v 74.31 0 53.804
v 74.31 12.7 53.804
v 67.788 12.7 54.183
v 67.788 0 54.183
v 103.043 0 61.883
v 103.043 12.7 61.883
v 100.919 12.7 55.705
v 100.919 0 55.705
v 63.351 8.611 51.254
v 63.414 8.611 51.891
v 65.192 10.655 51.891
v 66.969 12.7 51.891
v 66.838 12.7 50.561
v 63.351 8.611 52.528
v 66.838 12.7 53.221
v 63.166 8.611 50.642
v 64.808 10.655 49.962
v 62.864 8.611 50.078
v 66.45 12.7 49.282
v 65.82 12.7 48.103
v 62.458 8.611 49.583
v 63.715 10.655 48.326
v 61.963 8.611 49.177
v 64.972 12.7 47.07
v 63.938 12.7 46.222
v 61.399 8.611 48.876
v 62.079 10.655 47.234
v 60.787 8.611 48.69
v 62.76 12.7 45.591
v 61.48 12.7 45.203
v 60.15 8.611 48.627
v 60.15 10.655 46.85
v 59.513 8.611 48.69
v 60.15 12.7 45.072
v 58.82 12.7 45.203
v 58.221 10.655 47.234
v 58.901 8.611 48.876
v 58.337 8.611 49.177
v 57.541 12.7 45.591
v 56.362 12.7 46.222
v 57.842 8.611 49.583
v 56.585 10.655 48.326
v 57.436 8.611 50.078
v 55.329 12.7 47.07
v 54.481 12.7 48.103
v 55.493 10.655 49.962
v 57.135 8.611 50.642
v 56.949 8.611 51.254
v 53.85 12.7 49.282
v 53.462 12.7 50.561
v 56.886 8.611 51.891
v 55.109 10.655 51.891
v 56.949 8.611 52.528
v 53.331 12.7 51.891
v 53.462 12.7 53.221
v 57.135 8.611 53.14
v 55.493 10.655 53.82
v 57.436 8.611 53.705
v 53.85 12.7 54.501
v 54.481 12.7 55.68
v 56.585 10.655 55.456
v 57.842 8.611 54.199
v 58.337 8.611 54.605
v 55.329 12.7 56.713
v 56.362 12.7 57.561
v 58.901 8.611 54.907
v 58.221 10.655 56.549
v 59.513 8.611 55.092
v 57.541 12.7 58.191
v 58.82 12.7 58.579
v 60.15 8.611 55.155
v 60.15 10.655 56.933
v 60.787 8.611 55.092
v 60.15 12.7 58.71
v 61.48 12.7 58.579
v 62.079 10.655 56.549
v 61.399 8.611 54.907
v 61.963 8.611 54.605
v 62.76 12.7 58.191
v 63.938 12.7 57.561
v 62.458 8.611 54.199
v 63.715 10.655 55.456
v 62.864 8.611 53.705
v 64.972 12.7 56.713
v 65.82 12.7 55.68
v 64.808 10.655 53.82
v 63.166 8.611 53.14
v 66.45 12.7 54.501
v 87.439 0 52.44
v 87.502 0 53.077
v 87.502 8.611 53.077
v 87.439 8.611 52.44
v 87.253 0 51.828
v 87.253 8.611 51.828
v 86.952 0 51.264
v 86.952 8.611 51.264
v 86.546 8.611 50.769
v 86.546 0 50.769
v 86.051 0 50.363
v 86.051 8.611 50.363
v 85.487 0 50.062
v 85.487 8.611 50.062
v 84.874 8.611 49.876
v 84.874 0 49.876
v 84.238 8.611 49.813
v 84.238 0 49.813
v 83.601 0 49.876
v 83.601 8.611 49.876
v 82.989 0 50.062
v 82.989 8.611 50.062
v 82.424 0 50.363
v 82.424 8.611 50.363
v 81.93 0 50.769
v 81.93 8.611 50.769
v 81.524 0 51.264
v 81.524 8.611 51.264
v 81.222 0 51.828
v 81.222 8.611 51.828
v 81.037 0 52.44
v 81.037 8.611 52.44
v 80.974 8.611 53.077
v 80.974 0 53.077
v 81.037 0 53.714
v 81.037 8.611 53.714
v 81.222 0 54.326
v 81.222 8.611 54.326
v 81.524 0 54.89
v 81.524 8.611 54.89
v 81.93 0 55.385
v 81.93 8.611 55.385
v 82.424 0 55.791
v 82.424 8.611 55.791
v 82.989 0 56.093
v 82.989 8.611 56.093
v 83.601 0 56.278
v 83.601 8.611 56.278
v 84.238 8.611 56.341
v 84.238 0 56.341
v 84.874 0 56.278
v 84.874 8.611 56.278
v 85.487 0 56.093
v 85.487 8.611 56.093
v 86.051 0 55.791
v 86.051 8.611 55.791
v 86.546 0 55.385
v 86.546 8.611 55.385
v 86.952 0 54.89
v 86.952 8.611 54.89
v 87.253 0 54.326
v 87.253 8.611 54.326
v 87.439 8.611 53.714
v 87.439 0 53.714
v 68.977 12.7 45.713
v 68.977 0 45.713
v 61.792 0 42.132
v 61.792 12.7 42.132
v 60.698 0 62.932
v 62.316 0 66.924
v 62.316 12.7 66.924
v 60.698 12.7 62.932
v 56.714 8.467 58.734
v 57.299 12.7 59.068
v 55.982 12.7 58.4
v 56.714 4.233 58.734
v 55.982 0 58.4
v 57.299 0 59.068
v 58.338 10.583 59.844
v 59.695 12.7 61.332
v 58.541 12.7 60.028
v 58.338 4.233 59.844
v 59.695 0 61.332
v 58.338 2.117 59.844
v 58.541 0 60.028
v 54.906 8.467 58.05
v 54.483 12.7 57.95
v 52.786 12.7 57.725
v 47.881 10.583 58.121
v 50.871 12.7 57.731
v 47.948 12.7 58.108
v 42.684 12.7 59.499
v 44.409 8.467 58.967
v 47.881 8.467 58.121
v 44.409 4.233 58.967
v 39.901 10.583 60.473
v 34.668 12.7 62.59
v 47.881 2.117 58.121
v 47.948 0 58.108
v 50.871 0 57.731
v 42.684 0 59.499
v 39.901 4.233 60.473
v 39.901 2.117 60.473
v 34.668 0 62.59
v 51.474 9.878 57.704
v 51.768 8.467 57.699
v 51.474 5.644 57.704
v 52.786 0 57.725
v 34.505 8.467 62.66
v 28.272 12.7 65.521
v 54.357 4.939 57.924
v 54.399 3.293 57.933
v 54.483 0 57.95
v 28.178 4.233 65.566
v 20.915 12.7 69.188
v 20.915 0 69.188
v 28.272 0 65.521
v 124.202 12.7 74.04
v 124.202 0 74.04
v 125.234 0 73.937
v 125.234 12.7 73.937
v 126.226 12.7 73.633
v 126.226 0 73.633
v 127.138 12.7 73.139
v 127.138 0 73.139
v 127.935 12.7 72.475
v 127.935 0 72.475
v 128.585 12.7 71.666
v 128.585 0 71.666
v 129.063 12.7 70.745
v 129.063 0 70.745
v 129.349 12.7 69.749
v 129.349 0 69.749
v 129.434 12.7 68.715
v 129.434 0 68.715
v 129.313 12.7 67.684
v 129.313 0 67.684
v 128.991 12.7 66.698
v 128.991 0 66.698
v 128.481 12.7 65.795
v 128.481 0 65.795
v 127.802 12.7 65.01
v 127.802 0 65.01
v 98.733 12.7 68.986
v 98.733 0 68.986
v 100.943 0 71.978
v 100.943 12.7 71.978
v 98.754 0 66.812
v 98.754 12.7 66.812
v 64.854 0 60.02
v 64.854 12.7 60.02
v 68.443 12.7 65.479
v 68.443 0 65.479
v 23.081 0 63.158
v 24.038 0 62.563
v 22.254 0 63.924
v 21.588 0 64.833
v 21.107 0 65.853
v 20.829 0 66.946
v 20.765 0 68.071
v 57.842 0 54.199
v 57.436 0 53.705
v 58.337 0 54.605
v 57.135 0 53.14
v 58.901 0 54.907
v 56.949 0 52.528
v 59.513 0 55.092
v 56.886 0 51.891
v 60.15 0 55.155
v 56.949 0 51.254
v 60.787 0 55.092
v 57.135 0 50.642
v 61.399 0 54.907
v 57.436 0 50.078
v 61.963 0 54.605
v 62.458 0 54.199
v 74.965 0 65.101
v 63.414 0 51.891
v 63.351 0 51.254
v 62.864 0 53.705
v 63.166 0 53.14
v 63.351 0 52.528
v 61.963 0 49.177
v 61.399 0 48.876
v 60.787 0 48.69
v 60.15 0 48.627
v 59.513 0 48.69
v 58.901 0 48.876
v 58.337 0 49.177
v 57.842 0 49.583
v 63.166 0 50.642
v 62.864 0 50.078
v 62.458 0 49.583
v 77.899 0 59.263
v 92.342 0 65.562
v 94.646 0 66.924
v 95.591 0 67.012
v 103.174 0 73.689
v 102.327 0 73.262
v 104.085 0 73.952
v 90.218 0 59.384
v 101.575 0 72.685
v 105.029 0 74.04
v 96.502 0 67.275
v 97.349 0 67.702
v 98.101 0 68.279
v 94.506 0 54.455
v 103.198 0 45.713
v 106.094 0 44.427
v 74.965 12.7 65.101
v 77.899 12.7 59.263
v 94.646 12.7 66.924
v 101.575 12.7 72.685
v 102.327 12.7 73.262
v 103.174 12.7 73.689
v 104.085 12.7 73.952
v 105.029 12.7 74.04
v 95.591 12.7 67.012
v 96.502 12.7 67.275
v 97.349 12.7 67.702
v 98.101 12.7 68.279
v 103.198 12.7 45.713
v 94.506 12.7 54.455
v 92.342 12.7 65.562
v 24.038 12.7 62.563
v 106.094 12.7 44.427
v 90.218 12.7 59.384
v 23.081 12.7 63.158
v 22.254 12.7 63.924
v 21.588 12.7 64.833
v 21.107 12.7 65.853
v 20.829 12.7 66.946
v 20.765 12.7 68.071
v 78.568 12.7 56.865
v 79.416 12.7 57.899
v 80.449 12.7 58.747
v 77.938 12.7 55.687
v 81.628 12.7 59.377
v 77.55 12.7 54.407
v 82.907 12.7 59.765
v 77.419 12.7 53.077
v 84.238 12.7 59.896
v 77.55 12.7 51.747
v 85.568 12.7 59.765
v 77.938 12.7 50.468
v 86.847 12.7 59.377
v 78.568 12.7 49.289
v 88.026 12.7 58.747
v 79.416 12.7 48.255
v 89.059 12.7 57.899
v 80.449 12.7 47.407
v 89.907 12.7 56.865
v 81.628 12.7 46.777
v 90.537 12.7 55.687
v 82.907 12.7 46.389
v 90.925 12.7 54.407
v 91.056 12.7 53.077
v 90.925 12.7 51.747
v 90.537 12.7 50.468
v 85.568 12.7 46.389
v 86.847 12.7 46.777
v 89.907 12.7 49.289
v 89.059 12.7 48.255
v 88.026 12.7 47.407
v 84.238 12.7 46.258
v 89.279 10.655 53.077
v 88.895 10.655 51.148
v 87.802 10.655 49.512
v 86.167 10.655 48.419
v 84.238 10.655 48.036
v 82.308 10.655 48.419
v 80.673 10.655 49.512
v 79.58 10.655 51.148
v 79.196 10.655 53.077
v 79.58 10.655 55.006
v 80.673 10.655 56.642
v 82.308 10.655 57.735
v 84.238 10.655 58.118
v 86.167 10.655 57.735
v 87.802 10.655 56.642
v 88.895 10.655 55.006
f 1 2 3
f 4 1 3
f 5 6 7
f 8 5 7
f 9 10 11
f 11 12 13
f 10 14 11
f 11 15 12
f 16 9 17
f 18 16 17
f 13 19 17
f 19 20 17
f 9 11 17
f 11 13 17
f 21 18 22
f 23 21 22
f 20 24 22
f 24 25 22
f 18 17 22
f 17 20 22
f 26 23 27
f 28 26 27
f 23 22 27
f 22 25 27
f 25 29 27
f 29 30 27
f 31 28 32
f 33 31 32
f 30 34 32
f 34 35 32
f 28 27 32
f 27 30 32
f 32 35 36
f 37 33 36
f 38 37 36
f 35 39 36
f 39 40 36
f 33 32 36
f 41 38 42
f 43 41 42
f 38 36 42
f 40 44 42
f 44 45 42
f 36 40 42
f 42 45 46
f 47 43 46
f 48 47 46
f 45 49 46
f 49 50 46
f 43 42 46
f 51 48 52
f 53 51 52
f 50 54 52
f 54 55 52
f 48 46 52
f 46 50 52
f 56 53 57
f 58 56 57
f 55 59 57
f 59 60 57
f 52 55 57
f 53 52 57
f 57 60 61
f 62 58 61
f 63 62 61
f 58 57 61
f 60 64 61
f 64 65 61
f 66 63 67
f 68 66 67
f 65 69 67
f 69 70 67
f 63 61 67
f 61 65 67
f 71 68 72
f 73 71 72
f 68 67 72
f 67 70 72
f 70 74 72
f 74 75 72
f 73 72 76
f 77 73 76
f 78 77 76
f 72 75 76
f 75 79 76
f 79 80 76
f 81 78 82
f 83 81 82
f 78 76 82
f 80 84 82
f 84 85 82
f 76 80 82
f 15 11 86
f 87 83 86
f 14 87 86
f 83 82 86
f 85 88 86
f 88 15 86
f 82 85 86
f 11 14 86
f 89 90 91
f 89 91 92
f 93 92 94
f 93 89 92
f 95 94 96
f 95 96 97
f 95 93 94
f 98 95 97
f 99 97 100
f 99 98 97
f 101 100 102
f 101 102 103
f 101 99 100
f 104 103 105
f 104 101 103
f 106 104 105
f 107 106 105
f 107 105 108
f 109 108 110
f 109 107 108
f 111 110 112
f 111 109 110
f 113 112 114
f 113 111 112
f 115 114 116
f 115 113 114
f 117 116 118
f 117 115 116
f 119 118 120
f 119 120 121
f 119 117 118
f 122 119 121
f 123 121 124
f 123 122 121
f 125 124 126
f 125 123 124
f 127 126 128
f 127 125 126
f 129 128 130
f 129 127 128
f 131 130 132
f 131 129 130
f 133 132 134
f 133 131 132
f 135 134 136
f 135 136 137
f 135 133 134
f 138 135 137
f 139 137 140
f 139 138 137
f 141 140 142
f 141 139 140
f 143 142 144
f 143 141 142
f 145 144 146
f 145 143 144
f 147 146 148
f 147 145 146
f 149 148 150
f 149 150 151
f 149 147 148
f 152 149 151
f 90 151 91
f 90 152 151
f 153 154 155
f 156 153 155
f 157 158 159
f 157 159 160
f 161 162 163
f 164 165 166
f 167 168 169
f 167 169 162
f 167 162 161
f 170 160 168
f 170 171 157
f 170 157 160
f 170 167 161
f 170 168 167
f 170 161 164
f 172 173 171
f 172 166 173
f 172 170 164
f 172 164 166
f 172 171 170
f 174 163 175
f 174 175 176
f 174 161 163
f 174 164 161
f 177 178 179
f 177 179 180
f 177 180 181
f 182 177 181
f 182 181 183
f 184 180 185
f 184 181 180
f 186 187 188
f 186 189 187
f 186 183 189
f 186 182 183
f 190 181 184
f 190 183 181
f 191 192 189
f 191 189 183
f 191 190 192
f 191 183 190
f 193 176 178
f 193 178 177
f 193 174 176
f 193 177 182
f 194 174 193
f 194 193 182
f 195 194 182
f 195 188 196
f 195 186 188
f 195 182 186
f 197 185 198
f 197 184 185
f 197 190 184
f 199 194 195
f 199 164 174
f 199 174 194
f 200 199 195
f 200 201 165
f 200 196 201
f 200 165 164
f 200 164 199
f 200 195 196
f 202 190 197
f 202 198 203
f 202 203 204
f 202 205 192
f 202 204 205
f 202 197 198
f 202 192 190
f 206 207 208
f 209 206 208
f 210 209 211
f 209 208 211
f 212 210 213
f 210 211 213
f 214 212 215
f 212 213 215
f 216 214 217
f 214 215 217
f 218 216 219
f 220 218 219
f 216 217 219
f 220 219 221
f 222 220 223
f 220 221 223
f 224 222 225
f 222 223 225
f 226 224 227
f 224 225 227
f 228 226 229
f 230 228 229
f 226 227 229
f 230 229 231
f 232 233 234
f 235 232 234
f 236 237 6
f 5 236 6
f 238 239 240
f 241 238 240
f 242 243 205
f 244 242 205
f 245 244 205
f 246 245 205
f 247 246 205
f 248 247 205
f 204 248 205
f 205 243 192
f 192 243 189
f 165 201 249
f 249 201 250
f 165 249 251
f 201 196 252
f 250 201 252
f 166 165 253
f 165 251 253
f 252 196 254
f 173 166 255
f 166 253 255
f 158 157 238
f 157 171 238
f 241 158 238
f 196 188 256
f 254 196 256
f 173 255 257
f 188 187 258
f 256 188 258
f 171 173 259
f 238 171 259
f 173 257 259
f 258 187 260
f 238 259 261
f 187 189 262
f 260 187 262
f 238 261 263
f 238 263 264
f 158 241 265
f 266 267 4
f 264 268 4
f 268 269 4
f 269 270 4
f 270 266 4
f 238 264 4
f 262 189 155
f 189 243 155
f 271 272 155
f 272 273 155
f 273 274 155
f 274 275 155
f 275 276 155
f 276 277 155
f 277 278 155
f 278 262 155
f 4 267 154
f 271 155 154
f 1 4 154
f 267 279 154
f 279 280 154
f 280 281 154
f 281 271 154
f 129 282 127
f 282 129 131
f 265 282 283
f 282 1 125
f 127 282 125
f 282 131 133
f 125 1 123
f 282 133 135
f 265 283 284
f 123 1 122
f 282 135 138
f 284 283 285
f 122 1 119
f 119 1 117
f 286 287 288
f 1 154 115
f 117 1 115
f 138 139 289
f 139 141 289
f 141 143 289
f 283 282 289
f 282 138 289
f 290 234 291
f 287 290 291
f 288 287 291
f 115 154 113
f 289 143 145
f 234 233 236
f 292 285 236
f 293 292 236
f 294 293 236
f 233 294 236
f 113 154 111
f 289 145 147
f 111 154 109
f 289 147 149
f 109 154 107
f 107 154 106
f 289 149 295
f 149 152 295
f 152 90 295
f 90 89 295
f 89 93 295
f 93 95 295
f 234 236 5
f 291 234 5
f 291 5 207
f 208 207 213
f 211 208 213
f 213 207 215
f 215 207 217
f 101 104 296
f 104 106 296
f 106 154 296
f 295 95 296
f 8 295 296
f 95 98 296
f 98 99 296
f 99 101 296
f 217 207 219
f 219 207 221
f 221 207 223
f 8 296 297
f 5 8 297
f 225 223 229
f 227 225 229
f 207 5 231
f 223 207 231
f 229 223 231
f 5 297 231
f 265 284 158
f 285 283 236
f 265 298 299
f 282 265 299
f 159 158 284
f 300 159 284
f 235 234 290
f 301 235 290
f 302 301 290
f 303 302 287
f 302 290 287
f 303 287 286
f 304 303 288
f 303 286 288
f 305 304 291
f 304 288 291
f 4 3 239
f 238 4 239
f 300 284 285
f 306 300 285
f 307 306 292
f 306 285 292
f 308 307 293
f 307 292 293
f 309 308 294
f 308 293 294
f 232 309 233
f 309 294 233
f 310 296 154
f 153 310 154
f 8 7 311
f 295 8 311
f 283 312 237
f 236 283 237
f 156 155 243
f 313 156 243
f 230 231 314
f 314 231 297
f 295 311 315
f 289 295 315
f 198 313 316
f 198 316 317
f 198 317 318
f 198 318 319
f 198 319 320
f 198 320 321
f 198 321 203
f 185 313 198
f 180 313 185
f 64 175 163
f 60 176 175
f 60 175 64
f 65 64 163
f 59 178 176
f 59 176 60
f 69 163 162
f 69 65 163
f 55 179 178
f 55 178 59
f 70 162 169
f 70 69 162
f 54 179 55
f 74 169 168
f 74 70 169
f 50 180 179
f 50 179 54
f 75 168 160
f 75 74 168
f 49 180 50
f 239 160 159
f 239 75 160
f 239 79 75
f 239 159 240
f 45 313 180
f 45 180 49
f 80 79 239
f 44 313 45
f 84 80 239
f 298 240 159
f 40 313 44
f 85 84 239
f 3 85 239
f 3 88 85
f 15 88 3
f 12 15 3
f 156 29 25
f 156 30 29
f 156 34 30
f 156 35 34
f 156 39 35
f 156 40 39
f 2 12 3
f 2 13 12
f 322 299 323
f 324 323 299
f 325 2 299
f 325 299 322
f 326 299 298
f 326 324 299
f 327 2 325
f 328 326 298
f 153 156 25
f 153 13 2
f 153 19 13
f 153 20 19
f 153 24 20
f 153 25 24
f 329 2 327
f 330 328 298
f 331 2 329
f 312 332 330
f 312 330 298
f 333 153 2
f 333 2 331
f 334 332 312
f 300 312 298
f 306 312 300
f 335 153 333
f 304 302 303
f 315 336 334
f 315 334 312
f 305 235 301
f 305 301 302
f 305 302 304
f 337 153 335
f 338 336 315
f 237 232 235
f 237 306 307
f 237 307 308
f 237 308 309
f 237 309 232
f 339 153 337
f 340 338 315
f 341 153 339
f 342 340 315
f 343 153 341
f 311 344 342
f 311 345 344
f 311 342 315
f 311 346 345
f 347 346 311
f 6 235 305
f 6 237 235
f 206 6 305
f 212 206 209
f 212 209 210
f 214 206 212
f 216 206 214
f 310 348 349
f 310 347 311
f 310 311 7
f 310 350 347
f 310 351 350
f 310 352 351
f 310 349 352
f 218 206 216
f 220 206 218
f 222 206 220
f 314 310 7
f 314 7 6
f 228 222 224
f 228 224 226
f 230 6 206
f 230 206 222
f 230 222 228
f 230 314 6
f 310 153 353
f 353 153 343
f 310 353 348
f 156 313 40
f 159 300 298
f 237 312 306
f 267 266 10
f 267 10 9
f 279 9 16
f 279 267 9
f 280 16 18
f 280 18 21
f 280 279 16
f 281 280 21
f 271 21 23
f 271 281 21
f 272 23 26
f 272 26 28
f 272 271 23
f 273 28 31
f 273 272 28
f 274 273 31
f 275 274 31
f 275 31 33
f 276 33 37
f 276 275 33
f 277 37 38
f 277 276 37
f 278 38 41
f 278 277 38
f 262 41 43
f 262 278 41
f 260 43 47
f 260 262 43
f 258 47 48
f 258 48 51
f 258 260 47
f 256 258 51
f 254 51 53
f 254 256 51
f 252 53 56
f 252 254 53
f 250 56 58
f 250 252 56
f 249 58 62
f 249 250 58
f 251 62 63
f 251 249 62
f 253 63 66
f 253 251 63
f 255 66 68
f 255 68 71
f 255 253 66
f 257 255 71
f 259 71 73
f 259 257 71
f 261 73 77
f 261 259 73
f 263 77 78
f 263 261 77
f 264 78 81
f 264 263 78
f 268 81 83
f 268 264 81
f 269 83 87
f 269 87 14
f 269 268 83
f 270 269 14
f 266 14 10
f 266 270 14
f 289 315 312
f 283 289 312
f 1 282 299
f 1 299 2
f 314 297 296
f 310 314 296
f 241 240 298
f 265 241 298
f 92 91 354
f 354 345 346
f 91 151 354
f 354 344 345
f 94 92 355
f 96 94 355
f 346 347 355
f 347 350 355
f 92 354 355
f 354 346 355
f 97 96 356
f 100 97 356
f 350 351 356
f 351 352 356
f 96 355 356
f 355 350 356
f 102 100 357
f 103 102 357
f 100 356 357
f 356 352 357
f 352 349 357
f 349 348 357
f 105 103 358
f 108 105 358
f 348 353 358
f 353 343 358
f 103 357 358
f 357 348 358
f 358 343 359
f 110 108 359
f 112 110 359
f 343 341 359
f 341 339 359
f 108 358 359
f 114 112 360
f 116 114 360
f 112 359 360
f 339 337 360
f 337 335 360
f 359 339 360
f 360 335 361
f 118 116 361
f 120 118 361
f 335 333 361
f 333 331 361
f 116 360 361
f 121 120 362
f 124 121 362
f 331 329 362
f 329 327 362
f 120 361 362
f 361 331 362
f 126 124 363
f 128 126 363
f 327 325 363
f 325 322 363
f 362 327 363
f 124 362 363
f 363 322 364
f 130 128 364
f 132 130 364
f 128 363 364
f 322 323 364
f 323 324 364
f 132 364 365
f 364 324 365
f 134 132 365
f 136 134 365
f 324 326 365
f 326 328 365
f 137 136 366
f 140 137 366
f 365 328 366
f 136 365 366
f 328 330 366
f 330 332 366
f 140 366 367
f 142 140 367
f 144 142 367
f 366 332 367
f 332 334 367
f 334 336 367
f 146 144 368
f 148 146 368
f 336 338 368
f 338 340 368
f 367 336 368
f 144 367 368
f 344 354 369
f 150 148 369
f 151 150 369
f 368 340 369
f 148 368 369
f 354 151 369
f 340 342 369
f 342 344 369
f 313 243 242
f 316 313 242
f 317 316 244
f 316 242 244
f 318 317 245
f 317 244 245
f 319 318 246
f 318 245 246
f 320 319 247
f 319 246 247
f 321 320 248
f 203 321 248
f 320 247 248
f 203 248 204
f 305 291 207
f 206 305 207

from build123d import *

# Parameters (mm, degrees)
SKETCH1_R             = 3.2639
BOSS_EXTRUDE1_DEPTH   = 12.7
CHAMFER1_SIZE         = 4.0894
CHAMFER1_SIZE2        = 3.554861186
CHAMFER1_PART_2_SIZE  = 4.0894
CHAMFER1_PART_2_SIZE2 = 3.554861186
CUT_EXTRUDE1_DEPTH    = 13.7000001


with BuildPart() as part:
    # Sketch1 → Boss-Extrude1 (new body)
    with BuildSketch(Plane(origin=(0, 0, 0), x_dir=(1, 0, 0), z_dir=(0, 1, 0))):
        with BuildLine():
            Line((98.733031573, -68.985835228), (100.942599672, -71.978006872))
            ThreePointArc((100.942599672, -71.978006872), (102.740427245, -73.495514847), (105.029143887, -74.040299732))
            Line((105.029143887, -74.040299732), (124.201892168, -74.040299732))
            ThreePointArc((124.201892168, -74.040299732), (129.062693158, -70.745465469), (127.802444272, -65.010041176))
            Line((127.802444272, -65.010041176), (106.094318665, -44.426787292))
            Line((106.094318665, -44.426787292), (103.19820861, -45.713487798))
            Line((103.19820861, -45.713487798), (68.977352979, -45.713487798))
            Line((68.977352979, -45.713487798), (61.792374607, -42.131557151))
            Line((61.792374607, -42.131557151), (24.038270246, -62.563232545))
            ThreePointArc((24.038270246, -62.563232545), (21.322907648, -65.331673968), (20.915380805, -69.188017292))
            add(Edge.make_bspline(
                [(62.315611289, -66.923542367), (58.569118303, -55.043460273), (51.499770267, -53.452589153), (20.915380805, -69.188017292)],
                knots=[0, 0, 0, 0, 1, 1, 1, 1], degree=3))
            Line((62.315611289, -66.923542367), (94.646487358, -66.923542367))
            ThreePointArc((94.646487358, -66.923542367), (96.935204, -67.468327252), (98.733031573, -68.985835228))
        make_face()
        with Locations((60.150170667, -51.891201826)):
            Circle(SKETCH1_R, mode=Mode.SUBTRACT)
        with Locations((71.3764156, -59.641849895)):
            Circle(SKETCH1_R, mode=Mode.SUBTRACT)
        with Locations((84.237729699, -53.077081169)):
            Circle(SKETCH1_R, mode=Mode.SUBTRACT)
        with Locations((96.63028976, -60.633621731)):
            Circle(SKETCH1_R, mode=Mode.SUBTRACT)
    extrude(amount=BOSS_EXTRUDE1_DEPTH)

    # Chamfer1
    chamfer1_edges = [part.edges().sort_by_distance(p)[0] for p in [
        (56.886270667, 12.7, 51.891201826),
    ]]
    chamfer1_side = [part.faces().sort_by_distance(p)[0] for p in [
        (56.886270667, 6.35, 51.891201826),
    ]]
    chamfer(chamfer1_edges, length=CHAMFER1_SIZE, length2=CHAMFER1_SIZE2, reference=chamfer1_side[0])

    # Chamfer1 part 2
    chamfer1_part_2_edges = [part.edges().sort_by_distance(p)[0] for p in [
        (80.973829699, 12.7, 53.077081169),
    ]]
    chamfer1_part_2_side = [part.faces().sort_by_distance(p)[0] for p in [
        (80.973829699, 6.35, 53.077081169),
    ]]
    chamfer(chamfer1_part_2_edges, length=CHAMFER1_PART_2_SIZE, length2=CHAMFER1_PART_2_SIZE2, reference=chamfer1_part_2_side[0])

    # Sketch2 → Cut-Extrude1 (cut, through all)
    with BuildSketch(Plane(origin=(0, 12.7, 0), x_dir=(1, 0, 0), z_dir=(0, 1, 0))):
        Polygon((77.89856543, -59.263365519), (74.30971343, -53.804260267), (67.7875636, -54.182744643), (64.85426577, -60.020334272), (68.443117769, -65.479439524), (74.9652676, -65.100955148), align=None)
        Polygon((103.042754495, -61.883415654), (100.918875415, -55.705161331), (94.50641068, -54.455367408), (90.217825025, -59.383827808), (92.341704106, -65.562082131), (98.754168841, -66.811876054), align=None)
    extrude(amount=-CUT_EXTRUDE1_DEPTH, mode=Mode.SUBTRACT)


solid = part.part
